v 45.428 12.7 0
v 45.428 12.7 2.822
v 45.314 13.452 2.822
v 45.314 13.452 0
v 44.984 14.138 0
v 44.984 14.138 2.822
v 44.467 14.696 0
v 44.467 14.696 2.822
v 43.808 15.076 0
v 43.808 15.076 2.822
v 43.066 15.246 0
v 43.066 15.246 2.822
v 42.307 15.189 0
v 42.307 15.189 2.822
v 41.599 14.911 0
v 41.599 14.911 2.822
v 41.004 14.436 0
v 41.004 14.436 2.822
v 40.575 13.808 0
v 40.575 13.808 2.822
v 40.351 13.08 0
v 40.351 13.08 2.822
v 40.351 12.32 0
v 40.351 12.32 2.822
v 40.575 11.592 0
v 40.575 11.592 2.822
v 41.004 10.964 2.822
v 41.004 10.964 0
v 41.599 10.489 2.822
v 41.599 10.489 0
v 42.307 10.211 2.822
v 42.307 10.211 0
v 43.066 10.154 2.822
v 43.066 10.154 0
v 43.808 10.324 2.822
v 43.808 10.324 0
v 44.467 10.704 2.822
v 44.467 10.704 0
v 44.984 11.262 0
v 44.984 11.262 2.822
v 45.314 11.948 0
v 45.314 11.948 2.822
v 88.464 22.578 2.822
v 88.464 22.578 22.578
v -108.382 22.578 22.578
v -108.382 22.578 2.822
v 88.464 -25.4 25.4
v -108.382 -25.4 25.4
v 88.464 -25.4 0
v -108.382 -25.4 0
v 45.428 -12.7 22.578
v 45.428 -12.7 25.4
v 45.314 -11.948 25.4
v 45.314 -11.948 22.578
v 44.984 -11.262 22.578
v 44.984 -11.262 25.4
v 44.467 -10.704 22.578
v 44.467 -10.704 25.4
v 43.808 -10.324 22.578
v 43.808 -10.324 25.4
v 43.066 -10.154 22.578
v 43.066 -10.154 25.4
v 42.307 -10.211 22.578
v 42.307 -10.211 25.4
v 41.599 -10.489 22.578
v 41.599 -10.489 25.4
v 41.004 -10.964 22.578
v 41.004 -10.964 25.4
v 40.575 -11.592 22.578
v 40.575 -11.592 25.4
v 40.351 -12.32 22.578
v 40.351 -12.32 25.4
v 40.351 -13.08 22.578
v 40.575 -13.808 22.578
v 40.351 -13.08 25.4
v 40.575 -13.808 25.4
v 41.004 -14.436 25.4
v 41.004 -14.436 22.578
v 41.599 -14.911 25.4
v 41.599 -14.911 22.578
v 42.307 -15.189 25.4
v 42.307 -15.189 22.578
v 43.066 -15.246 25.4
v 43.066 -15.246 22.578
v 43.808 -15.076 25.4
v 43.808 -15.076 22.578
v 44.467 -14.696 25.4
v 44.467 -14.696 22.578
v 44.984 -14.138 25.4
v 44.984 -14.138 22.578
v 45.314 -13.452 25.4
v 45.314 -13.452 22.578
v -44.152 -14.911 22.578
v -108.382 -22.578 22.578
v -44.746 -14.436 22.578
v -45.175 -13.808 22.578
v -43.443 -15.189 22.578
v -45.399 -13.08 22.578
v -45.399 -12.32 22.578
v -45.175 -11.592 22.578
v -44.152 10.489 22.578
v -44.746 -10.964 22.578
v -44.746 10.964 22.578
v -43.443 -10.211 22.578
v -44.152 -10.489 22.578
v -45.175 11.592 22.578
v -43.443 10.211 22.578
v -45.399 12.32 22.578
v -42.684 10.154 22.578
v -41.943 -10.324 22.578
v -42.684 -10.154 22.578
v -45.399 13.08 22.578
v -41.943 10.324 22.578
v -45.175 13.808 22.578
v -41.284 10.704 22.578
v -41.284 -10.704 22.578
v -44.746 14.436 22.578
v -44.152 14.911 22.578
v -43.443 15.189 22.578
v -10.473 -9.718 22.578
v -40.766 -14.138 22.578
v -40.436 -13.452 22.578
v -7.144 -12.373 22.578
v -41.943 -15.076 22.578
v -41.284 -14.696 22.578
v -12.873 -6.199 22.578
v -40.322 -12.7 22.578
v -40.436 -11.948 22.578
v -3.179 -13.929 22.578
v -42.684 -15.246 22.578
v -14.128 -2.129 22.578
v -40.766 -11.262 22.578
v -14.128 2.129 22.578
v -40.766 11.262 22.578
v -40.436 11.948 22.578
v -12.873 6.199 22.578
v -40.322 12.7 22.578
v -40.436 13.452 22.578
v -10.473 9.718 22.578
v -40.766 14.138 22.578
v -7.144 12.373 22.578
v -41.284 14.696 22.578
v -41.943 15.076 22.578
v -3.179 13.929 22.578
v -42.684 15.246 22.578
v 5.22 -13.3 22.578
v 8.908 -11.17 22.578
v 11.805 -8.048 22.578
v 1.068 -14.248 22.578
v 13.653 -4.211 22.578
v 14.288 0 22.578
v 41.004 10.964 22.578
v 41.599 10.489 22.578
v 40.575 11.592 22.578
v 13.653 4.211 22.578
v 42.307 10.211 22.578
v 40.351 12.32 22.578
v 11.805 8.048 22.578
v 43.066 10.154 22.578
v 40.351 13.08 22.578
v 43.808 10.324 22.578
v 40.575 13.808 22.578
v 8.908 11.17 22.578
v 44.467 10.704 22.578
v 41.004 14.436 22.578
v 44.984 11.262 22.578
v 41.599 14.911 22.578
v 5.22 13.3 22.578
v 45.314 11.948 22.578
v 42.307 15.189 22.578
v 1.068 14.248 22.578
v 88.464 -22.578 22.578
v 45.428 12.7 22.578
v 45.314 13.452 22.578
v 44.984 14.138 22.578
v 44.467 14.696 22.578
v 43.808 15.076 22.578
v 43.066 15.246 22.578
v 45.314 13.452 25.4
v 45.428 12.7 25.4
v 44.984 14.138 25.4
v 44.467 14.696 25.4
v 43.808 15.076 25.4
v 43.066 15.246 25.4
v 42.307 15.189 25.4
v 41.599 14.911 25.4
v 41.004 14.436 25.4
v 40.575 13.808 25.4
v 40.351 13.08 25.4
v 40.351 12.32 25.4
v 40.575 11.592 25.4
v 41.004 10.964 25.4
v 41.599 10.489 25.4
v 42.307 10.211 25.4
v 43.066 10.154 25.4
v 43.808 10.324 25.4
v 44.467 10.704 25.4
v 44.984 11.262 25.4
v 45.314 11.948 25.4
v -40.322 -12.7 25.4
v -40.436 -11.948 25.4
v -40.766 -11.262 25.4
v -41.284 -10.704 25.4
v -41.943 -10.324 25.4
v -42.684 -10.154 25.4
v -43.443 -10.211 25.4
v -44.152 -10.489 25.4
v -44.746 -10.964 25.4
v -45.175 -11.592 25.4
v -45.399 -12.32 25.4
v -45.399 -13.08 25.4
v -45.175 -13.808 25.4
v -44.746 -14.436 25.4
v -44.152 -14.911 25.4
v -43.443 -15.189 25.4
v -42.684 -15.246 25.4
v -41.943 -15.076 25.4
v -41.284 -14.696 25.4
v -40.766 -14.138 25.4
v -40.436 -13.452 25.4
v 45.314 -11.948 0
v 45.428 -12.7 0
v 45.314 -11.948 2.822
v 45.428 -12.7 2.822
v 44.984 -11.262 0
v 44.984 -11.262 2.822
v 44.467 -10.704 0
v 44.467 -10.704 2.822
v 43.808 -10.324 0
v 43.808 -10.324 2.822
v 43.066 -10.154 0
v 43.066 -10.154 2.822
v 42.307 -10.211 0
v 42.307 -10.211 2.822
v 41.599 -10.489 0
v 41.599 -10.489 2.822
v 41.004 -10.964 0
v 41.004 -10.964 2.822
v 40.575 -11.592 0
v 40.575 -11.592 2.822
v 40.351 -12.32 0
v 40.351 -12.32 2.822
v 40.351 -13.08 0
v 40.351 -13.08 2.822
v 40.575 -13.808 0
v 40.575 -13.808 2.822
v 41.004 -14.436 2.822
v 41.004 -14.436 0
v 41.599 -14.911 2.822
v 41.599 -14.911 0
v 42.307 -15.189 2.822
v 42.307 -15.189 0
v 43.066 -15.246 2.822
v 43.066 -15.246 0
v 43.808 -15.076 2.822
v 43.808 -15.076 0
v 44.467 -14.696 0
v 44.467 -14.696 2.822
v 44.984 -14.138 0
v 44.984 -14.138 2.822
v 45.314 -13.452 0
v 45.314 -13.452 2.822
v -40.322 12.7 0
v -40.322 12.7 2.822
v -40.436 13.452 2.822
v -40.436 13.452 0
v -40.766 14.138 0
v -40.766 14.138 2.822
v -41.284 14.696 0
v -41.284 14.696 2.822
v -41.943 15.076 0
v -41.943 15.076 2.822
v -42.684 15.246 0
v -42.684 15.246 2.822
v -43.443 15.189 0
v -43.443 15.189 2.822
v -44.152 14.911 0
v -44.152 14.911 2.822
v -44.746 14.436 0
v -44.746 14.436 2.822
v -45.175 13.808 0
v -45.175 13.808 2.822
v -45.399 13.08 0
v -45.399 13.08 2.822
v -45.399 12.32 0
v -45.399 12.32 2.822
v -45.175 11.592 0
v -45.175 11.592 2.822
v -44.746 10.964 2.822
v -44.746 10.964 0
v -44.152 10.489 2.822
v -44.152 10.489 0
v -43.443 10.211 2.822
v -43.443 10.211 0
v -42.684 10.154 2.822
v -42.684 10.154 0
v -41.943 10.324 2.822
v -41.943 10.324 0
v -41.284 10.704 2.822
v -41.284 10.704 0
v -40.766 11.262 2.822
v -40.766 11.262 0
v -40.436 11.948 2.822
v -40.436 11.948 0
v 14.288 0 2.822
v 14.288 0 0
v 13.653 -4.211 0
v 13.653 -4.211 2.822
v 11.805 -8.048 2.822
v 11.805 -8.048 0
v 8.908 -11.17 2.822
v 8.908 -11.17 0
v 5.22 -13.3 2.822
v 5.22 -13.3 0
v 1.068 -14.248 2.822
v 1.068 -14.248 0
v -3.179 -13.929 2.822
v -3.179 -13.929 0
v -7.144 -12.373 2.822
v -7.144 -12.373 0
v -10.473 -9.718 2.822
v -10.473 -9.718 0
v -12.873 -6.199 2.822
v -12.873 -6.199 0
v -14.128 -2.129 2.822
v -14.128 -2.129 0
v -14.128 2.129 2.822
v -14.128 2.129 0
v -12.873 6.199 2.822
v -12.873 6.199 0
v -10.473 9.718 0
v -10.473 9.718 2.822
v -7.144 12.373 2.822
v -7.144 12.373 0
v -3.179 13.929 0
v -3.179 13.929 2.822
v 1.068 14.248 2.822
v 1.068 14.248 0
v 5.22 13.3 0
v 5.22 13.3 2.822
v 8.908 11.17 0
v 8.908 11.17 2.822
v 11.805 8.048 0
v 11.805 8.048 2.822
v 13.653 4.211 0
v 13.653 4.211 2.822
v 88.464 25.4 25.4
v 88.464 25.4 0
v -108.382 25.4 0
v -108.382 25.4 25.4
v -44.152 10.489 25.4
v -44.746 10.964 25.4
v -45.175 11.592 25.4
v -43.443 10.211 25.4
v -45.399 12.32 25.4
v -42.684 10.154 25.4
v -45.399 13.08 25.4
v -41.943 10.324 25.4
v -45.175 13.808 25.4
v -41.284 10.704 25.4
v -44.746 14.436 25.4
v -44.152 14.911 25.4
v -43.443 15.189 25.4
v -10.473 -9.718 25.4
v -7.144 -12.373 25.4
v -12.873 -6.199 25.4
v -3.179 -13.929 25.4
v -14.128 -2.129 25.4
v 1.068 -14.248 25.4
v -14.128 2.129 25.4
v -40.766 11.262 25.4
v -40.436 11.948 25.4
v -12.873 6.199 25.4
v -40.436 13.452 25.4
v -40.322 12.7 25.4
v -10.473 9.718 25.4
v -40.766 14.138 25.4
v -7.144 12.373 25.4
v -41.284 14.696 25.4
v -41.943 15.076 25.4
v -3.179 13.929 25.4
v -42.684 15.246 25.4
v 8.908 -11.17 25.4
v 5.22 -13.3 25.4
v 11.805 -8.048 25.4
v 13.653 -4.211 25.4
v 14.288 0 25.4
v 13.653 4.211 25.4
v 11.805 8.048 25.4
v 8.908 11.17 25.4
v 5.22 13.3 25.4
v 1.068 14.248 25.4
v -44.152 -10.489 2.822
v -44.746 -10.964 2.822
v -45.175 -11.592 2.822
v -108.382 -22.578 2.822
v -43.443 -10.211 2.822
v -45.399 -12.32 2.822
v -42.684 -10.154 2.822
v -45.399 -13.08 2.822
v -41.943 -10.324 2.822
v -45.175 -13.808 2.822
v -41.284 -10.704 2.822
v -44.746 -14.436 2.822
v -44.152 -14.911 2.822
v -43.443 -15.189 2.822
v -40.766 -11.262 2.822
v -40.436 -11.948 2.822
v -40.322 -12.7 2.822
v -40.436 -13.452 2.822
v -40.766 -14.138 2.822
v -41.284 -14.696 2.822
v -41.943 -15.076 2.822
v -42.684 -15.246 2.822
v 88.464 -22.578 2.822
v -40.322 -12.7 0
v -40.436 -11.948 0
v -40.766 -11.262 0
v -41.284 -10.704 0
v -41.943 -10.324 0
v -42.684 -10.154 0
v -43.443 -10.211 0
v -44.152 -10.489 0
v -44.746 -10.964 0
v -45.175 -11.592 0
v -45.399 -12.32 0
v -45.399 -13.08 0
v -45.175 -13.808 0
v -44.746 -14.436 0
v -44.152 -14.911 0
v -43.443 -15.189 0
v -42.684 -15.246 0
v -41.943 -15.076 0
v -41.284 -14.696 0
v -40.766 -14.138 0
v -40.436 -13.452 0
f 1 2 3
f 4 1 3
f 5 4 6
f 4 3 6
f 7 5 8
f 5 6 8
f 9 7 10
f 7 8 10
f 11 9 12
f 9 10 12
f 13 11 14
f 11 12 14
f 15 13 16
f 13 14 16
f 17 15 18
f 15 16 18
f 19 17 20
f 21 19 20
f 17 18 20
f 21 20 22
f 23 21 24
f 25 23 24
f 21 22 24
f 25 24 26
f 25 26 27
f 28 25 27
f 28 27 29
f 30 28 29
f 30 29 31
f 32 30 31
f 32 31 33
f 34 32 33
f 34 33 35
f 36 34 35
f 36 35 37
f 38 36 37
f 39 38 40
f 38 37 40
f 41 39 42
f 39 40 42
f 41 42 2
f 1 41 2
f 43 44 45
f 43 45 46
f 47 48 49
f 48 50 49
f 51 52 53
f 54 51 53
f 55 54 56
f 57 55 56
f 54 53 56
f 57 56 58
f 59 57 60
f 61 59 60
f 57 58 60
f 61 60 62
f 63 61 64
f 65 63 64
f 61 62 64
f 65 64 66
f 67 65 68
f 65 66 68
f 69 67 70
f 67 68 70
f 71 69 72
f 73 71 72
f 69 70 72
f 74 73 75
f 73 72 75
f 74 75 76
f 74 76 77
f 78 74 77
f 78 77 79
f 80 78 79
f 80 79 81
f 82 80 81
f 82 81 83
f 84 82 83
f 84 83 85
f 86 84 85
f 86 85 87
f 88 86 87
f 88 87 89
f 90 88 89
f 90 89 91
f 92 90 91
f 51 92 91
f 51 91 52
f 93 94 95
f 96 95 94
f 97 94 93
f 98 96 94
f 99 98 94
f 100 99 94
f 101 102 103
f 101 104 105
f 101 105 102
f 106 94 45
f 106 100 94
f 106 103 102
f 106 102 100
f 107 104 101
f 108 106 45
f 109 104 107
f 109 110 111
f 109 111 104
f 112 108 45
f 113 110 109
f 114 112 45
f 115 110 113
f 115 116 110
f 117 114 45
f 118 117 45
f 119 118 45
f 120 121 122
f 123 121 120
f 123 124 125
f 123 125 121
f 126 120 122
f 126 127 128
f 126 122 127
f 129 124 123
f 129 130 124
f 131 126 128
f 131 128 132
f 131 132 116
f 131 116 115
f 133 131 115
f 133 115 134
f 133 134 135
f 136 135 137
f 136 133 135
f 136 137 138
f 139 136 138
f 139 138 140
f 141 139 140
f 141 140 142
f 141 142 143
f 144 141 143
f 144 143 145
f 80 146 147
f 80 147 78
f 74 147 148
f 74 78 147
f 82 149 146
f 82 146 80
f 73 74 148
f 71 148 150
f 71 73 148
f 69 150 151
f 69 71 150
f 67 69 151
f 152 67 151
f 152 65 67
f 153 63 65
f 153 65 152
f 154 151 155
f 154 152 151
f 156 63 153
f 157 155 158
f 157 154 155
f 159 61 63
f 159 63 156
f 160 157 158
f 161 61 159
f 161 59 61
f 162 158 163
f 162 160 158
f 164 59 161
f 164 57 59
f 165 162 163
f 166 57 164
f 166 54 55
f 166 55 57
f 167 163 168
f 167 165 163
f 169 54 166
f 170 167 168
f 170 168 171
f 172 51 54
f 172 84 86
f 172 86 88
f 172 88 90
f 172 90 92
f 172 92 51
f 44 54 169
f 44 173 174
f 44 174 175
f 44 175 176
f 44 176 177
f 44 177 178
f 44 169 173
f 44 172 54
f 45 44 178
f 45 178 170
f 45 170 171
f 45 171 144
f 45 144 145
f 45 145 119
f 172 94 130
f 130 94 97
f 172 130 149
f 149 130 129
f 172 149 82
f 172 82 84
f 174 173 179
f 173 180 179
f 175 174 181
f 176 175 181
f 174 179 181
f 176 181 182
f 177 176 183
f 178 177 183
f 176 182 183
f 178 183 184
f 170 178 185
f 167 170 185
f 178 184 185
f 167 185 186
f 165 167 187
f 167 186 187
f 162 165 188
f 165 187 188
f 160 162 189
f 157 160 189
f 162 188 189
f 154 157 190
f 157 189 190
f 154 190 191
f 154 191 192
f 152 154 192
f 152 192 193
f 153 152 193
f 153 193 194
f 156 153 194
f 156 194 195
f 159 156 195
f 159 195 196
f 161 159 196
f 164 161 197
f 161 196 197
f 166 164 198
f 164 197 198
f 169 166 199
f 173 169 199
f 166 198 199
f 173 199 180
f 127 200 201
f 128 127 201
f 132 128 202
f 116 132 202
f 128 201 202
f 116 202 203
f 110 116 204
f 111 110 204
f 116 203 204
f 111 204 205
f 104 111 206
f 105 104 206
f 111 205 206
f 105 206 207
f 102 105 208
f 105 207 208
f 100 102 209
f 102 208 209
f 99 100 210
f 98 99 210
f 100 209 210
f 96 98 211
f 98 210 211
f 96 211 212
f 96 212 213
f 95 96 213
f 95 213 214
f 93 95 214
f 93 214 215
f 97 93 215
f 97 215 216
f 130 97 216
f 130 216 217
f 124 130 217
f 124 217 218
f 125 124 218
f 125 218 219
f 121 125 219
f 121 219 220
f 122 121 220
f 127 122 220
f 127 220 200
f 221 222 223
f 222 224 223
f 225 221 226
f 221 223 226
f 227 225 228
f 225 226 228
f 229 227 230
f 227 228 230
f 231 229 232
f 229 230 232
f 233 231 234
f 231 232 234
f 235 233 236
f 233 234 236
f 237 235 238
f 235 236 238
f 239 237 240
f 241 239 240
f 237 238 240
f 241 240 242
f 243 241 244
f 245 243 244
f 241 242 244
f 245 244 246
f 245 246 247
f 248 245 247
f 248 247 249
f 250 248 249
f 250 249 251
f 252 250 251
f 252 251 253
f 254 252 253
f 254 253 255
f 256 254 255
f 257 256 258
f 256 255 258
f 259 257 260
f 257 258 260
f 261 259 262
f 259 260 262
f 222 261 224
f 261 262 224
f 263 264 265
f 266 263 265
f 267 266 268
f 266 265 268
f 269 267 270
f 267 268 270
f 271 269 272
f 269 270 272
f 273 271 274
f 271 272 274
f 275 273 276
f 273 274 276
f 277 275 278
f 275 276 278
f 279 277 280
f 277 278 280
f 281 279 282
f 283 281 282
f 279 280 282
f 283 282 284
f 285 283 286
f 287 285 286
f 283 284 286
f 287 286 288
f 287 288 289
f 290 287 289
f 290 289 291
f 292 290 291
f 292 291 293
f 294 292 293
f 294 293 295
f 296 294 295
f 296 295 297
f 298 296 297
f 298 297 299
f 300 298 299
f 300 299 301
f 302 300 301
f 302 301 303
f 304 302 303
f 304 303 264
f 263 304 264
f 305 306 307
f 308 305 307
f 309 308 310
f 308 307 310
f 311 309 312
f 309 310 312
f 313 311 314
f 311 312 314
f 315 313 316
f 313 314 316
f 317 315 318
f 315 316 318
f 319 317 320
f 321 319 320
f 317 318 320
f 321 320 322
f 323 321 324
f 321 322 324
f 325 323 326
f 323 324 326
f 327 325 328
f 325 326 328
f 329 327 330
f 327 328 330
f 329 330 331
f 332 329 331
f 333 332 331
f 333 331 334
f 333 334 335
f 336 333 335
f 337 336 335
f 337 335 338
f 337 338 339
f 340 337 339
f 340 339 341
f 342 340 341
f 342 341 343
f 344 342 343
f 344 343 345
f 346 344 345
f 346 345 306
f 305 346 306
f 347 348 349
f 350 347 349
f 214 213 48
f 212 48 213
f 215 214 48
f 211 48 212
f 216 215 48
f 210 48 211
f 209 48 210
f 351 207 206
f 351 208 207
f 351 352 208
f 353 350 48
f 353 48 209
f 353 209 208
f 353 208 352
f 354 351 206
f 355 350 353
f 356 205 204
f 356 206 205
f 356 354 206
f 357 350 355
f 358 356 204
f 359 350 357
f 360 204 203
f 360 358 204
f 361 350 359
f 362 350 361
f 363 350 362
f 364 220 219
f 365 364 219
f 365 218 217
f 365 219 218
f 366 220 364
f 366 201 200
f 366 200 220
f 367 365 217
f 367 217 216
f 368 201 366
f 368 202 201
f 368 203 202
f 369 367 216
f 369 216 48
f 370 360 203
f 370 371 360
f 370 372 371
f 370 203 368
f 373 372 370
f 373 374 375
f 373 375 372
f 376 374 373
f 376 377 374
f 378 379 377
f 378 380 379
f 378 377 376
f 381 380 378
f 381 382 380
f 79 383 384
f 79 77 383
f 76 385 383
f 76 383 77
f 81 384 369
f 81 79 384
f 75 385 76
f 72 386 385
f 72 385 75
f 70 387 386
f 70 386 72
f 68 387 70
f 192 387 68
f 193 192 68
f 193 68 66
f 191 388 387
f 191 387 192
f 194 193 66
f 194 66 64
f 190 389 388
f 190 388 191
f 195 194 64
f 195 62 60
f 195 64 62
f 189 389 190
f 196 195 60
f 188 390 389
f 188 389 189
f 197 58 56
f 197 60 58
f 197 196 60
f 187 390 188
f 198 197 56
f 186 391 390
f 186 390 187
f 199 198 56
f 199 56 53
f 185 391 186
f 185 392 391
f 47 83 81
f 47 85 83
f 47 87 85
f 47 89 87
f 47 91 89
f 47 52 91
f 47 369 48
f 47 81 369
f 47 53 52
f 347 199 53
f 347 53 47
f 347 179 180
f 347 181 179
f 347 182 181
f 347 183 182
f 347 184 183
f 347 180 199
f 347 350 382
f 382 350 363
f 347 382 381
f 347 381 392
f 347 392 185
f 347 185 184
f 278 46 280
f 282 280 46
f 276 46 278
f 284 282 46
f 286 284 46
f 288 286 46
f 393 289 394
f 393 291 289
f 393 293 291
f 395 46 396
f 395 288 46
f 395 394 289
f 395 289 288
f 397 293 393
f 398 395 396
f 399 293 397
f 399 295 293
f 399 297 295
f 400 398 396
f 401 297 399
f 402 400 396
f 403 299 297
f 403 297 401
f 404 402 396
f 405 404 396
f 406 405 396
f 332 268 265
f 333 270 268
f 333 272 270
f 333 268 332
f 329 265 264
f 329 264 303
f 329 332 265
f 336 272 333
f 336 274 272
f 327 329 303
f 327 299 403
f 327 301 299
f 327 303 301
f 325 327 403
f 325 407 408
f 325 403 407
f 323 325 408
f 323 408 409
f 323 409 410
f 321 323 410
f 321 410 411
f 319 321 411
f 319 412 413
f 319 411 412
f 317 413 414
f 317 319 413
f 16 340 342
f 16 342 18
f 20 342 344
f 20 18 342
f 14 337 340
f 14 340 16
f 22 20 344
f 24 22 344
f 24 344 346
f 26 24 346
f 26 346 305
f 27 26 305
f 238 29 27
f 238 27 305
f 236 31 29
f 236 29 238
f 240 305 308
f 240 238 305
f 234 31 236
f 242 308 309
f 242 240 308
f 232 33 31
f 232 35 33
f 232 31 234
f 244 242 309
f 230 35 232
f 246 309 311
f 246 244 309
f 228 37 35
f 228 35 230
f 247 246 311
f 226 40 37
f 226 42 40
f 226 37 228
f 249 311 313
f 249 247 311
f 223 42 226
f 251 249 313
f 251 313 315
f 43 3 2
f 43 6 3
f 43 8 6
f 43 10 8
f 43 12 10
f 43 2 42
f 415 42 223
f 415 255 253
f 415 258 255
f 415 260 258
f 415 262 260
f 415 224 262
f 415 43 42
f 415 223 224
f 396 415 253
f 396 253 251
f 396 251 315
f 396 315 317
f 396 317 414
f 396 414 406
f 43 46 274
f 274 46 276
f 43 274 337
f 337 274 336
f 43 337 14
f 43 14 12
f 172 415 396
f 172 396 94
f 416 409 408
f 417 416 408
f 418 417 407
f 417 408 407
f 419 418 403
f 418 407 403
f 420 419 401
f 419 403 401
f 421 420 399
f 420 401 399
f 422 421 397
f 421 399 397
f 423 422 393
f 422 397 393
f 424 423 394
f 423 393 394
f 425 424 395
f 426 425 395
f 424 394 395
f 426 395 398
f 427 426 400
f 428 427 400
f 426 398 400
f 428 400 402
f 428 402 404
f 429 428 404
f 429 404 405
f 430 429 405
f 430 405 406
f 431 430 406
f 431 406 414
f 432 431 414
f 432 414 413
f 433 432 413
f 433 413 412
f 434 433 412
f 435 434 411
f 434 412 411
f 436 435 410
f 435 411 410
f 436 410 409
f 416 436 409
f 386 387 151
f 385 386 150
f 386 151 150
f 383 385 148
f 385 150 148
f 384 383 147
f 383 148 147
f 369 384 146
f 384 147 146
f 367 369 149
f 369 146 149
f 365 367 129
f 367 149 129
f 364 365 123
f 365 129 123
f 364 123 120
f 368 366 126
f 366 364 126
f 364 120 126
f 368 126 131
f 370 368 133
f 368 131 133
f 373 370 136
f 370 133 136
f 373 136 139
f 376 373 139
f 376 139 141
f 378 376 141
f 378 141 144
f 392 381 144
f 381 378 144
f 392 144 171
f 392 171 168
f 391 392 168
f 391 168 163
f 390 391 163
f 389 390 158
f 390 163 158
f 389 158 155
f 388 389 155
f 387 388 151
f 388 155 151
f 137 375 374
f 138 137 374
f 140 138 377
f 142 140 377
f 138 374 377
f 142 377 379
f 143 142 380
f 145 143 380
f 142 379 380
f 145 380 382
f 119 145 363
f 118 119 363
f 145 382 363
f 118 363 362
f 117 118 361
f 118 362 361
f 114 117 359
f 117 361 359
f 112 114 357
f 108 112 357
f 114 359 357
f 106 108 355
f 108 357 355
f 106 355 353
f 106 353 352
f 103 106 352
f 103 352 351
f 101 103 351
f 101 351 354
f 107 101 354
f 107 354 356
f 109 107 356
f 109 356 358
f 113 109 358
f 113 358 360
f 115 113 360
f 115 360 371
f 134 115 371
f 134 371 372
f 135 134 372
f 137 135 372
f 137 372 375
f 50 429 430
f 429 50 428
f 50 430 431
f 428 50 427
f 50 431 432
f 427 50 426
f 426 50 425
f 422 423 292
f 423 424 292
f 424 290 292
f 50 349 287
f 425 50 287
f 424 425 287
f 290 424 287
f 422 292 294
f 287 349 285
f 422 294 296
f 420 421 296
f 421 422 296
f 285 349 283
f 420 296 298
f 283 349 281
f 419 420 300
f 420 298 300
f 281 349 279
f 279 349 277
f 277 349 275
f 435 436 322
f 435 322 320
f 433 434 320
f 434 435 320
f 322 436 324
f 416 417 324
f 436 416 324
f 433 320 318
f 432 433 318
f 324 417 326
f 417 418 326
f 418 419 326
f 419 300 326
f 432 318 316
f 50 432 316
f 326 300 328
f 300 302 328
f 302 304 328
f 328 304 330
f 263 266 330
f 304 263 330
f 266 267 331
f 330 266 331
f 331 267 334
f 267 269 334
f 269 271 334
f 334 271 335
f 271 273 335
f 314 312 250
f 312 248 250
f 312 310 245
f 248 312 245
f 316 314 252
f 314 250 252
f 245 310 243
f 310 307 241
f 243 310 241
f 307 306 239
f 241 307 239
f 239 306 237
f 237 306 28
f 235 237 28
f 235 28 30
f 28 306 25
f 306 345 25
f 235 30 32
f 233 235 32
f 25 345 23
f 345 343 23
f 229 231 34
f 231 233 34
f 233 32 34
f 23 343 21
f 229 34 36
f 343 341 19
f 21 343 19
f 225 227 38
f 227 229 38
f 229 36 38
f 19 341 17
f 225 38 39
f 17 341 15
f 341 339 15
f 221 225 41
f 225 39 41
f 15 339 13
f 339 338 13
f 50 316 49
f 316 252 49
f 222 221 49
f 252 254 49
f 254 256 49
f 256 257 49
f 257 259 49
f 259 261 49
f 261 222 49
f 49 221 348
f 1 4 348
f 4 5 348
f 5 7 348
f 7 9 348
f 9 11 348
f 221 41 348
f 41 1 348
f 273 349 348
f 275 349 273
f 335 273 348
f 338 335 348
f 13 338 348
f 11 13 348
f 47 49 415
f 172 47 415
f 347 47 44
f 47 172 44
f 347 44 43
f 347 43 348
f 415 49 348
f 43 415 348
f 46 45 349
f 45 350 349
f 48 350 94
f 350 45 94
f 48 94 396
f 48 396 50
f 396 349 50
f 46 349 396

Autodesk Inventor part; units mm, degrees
ref_plane "YZ Plane" through (0, 0, 0) normal (1, 0, 0) x (0, 1, 0)
ref_plane "XZ Plane" through (0, 0, 0) normal (0, 1, 0) x (-1, 0, 0)
ref_plane "XY Plane" through (0, 0, 0) normal (0, 0, 1) x (1, 0, 0)
sketch "Sketch1" plane through (0, 0, 0) normal (0, 0, 1) x (1, 0, 0)
  circle A0 centre (0, 0) radius 14.2875
  line L0 (88.4644, 25.4) -> (-108.3818, 25.4)
  line L1 (-108.3818, 25.4) -> (-108.3818, -25.4)
  line L2 (-108.3818, -25.4) -> (88.4644, -25.4)
  line L3 (88.4644, -25.4) -> (88.4644, 25.4)
  dimension "d0" = 28.575
  dimension "d4" = 50.8
  dimension "d15" = 88.4644
  dimension "d16" = 108.3818
extrude "Extrusion1" add sketch "Sketch1" along normal blind 25.4
sketch "Sketch2" plane through (88.4644, -25.4, 0) normal (1, 0, 0) x (0, 0, -1)
  line L0 (0, 50.8) -> (-25.4, 50.8) projected
  line L1 (0, 0) -> (-25.4, 0) projected
  line L2 (0, 50.8) -> (-25.4, 50.8)
  line L3 (-25.4, 50.8) -> (-25.4, 0)
  line L4 (-25.4, 0) -> (0, 0)
  line L5 (0, 0) -> (0, 50.8)
  line L6 (-22.5778, 2.8222) -> (-22.5778, 47.9778)
  line L7 (-22.5778, 47.9778) -> (-2.8222, 47.9778)
  line L8 (-2.8222, 47.9778) -> (-2.8222, 2.8222)
  line L9 (-2.8222, 2.8222) -> (-22.5778, 2.8222)
  point P0 (0, 25.4)
  dimension "d7" = 2.8222
extrude "Extrusion2" cut sketch "Sketch2" against normal blind 203.2 contours L6 L7 L8 L9
sketch "Sketch3" plane through (0, 0, 25.4) normal (0, 0, 1) x (1, 0, 0)
  circle A0 centre (42.8752, 12.7) radius 2.5527
  circle A1 centre (42.8752, -12.7) radius 2.5527
  circle A2 centre (-42.8752, 12.7) radius 2.5527
  circle A3 centre (-42.8752, -12.7) radius 2.5527
  point P0 (0, 0)
  dimension "d12" = 5.1054
extrude "Extrusion3" cut sketch "Sketch3" against normal blind 25.4
sketch "Sketch4" plane through (0, 0, 25.4) normal (0, 0, 1) x (1, 0, 0)
  point P0 (0, 0)
properties part number "gearboxsupportbar" material "Aluminum 6061"
